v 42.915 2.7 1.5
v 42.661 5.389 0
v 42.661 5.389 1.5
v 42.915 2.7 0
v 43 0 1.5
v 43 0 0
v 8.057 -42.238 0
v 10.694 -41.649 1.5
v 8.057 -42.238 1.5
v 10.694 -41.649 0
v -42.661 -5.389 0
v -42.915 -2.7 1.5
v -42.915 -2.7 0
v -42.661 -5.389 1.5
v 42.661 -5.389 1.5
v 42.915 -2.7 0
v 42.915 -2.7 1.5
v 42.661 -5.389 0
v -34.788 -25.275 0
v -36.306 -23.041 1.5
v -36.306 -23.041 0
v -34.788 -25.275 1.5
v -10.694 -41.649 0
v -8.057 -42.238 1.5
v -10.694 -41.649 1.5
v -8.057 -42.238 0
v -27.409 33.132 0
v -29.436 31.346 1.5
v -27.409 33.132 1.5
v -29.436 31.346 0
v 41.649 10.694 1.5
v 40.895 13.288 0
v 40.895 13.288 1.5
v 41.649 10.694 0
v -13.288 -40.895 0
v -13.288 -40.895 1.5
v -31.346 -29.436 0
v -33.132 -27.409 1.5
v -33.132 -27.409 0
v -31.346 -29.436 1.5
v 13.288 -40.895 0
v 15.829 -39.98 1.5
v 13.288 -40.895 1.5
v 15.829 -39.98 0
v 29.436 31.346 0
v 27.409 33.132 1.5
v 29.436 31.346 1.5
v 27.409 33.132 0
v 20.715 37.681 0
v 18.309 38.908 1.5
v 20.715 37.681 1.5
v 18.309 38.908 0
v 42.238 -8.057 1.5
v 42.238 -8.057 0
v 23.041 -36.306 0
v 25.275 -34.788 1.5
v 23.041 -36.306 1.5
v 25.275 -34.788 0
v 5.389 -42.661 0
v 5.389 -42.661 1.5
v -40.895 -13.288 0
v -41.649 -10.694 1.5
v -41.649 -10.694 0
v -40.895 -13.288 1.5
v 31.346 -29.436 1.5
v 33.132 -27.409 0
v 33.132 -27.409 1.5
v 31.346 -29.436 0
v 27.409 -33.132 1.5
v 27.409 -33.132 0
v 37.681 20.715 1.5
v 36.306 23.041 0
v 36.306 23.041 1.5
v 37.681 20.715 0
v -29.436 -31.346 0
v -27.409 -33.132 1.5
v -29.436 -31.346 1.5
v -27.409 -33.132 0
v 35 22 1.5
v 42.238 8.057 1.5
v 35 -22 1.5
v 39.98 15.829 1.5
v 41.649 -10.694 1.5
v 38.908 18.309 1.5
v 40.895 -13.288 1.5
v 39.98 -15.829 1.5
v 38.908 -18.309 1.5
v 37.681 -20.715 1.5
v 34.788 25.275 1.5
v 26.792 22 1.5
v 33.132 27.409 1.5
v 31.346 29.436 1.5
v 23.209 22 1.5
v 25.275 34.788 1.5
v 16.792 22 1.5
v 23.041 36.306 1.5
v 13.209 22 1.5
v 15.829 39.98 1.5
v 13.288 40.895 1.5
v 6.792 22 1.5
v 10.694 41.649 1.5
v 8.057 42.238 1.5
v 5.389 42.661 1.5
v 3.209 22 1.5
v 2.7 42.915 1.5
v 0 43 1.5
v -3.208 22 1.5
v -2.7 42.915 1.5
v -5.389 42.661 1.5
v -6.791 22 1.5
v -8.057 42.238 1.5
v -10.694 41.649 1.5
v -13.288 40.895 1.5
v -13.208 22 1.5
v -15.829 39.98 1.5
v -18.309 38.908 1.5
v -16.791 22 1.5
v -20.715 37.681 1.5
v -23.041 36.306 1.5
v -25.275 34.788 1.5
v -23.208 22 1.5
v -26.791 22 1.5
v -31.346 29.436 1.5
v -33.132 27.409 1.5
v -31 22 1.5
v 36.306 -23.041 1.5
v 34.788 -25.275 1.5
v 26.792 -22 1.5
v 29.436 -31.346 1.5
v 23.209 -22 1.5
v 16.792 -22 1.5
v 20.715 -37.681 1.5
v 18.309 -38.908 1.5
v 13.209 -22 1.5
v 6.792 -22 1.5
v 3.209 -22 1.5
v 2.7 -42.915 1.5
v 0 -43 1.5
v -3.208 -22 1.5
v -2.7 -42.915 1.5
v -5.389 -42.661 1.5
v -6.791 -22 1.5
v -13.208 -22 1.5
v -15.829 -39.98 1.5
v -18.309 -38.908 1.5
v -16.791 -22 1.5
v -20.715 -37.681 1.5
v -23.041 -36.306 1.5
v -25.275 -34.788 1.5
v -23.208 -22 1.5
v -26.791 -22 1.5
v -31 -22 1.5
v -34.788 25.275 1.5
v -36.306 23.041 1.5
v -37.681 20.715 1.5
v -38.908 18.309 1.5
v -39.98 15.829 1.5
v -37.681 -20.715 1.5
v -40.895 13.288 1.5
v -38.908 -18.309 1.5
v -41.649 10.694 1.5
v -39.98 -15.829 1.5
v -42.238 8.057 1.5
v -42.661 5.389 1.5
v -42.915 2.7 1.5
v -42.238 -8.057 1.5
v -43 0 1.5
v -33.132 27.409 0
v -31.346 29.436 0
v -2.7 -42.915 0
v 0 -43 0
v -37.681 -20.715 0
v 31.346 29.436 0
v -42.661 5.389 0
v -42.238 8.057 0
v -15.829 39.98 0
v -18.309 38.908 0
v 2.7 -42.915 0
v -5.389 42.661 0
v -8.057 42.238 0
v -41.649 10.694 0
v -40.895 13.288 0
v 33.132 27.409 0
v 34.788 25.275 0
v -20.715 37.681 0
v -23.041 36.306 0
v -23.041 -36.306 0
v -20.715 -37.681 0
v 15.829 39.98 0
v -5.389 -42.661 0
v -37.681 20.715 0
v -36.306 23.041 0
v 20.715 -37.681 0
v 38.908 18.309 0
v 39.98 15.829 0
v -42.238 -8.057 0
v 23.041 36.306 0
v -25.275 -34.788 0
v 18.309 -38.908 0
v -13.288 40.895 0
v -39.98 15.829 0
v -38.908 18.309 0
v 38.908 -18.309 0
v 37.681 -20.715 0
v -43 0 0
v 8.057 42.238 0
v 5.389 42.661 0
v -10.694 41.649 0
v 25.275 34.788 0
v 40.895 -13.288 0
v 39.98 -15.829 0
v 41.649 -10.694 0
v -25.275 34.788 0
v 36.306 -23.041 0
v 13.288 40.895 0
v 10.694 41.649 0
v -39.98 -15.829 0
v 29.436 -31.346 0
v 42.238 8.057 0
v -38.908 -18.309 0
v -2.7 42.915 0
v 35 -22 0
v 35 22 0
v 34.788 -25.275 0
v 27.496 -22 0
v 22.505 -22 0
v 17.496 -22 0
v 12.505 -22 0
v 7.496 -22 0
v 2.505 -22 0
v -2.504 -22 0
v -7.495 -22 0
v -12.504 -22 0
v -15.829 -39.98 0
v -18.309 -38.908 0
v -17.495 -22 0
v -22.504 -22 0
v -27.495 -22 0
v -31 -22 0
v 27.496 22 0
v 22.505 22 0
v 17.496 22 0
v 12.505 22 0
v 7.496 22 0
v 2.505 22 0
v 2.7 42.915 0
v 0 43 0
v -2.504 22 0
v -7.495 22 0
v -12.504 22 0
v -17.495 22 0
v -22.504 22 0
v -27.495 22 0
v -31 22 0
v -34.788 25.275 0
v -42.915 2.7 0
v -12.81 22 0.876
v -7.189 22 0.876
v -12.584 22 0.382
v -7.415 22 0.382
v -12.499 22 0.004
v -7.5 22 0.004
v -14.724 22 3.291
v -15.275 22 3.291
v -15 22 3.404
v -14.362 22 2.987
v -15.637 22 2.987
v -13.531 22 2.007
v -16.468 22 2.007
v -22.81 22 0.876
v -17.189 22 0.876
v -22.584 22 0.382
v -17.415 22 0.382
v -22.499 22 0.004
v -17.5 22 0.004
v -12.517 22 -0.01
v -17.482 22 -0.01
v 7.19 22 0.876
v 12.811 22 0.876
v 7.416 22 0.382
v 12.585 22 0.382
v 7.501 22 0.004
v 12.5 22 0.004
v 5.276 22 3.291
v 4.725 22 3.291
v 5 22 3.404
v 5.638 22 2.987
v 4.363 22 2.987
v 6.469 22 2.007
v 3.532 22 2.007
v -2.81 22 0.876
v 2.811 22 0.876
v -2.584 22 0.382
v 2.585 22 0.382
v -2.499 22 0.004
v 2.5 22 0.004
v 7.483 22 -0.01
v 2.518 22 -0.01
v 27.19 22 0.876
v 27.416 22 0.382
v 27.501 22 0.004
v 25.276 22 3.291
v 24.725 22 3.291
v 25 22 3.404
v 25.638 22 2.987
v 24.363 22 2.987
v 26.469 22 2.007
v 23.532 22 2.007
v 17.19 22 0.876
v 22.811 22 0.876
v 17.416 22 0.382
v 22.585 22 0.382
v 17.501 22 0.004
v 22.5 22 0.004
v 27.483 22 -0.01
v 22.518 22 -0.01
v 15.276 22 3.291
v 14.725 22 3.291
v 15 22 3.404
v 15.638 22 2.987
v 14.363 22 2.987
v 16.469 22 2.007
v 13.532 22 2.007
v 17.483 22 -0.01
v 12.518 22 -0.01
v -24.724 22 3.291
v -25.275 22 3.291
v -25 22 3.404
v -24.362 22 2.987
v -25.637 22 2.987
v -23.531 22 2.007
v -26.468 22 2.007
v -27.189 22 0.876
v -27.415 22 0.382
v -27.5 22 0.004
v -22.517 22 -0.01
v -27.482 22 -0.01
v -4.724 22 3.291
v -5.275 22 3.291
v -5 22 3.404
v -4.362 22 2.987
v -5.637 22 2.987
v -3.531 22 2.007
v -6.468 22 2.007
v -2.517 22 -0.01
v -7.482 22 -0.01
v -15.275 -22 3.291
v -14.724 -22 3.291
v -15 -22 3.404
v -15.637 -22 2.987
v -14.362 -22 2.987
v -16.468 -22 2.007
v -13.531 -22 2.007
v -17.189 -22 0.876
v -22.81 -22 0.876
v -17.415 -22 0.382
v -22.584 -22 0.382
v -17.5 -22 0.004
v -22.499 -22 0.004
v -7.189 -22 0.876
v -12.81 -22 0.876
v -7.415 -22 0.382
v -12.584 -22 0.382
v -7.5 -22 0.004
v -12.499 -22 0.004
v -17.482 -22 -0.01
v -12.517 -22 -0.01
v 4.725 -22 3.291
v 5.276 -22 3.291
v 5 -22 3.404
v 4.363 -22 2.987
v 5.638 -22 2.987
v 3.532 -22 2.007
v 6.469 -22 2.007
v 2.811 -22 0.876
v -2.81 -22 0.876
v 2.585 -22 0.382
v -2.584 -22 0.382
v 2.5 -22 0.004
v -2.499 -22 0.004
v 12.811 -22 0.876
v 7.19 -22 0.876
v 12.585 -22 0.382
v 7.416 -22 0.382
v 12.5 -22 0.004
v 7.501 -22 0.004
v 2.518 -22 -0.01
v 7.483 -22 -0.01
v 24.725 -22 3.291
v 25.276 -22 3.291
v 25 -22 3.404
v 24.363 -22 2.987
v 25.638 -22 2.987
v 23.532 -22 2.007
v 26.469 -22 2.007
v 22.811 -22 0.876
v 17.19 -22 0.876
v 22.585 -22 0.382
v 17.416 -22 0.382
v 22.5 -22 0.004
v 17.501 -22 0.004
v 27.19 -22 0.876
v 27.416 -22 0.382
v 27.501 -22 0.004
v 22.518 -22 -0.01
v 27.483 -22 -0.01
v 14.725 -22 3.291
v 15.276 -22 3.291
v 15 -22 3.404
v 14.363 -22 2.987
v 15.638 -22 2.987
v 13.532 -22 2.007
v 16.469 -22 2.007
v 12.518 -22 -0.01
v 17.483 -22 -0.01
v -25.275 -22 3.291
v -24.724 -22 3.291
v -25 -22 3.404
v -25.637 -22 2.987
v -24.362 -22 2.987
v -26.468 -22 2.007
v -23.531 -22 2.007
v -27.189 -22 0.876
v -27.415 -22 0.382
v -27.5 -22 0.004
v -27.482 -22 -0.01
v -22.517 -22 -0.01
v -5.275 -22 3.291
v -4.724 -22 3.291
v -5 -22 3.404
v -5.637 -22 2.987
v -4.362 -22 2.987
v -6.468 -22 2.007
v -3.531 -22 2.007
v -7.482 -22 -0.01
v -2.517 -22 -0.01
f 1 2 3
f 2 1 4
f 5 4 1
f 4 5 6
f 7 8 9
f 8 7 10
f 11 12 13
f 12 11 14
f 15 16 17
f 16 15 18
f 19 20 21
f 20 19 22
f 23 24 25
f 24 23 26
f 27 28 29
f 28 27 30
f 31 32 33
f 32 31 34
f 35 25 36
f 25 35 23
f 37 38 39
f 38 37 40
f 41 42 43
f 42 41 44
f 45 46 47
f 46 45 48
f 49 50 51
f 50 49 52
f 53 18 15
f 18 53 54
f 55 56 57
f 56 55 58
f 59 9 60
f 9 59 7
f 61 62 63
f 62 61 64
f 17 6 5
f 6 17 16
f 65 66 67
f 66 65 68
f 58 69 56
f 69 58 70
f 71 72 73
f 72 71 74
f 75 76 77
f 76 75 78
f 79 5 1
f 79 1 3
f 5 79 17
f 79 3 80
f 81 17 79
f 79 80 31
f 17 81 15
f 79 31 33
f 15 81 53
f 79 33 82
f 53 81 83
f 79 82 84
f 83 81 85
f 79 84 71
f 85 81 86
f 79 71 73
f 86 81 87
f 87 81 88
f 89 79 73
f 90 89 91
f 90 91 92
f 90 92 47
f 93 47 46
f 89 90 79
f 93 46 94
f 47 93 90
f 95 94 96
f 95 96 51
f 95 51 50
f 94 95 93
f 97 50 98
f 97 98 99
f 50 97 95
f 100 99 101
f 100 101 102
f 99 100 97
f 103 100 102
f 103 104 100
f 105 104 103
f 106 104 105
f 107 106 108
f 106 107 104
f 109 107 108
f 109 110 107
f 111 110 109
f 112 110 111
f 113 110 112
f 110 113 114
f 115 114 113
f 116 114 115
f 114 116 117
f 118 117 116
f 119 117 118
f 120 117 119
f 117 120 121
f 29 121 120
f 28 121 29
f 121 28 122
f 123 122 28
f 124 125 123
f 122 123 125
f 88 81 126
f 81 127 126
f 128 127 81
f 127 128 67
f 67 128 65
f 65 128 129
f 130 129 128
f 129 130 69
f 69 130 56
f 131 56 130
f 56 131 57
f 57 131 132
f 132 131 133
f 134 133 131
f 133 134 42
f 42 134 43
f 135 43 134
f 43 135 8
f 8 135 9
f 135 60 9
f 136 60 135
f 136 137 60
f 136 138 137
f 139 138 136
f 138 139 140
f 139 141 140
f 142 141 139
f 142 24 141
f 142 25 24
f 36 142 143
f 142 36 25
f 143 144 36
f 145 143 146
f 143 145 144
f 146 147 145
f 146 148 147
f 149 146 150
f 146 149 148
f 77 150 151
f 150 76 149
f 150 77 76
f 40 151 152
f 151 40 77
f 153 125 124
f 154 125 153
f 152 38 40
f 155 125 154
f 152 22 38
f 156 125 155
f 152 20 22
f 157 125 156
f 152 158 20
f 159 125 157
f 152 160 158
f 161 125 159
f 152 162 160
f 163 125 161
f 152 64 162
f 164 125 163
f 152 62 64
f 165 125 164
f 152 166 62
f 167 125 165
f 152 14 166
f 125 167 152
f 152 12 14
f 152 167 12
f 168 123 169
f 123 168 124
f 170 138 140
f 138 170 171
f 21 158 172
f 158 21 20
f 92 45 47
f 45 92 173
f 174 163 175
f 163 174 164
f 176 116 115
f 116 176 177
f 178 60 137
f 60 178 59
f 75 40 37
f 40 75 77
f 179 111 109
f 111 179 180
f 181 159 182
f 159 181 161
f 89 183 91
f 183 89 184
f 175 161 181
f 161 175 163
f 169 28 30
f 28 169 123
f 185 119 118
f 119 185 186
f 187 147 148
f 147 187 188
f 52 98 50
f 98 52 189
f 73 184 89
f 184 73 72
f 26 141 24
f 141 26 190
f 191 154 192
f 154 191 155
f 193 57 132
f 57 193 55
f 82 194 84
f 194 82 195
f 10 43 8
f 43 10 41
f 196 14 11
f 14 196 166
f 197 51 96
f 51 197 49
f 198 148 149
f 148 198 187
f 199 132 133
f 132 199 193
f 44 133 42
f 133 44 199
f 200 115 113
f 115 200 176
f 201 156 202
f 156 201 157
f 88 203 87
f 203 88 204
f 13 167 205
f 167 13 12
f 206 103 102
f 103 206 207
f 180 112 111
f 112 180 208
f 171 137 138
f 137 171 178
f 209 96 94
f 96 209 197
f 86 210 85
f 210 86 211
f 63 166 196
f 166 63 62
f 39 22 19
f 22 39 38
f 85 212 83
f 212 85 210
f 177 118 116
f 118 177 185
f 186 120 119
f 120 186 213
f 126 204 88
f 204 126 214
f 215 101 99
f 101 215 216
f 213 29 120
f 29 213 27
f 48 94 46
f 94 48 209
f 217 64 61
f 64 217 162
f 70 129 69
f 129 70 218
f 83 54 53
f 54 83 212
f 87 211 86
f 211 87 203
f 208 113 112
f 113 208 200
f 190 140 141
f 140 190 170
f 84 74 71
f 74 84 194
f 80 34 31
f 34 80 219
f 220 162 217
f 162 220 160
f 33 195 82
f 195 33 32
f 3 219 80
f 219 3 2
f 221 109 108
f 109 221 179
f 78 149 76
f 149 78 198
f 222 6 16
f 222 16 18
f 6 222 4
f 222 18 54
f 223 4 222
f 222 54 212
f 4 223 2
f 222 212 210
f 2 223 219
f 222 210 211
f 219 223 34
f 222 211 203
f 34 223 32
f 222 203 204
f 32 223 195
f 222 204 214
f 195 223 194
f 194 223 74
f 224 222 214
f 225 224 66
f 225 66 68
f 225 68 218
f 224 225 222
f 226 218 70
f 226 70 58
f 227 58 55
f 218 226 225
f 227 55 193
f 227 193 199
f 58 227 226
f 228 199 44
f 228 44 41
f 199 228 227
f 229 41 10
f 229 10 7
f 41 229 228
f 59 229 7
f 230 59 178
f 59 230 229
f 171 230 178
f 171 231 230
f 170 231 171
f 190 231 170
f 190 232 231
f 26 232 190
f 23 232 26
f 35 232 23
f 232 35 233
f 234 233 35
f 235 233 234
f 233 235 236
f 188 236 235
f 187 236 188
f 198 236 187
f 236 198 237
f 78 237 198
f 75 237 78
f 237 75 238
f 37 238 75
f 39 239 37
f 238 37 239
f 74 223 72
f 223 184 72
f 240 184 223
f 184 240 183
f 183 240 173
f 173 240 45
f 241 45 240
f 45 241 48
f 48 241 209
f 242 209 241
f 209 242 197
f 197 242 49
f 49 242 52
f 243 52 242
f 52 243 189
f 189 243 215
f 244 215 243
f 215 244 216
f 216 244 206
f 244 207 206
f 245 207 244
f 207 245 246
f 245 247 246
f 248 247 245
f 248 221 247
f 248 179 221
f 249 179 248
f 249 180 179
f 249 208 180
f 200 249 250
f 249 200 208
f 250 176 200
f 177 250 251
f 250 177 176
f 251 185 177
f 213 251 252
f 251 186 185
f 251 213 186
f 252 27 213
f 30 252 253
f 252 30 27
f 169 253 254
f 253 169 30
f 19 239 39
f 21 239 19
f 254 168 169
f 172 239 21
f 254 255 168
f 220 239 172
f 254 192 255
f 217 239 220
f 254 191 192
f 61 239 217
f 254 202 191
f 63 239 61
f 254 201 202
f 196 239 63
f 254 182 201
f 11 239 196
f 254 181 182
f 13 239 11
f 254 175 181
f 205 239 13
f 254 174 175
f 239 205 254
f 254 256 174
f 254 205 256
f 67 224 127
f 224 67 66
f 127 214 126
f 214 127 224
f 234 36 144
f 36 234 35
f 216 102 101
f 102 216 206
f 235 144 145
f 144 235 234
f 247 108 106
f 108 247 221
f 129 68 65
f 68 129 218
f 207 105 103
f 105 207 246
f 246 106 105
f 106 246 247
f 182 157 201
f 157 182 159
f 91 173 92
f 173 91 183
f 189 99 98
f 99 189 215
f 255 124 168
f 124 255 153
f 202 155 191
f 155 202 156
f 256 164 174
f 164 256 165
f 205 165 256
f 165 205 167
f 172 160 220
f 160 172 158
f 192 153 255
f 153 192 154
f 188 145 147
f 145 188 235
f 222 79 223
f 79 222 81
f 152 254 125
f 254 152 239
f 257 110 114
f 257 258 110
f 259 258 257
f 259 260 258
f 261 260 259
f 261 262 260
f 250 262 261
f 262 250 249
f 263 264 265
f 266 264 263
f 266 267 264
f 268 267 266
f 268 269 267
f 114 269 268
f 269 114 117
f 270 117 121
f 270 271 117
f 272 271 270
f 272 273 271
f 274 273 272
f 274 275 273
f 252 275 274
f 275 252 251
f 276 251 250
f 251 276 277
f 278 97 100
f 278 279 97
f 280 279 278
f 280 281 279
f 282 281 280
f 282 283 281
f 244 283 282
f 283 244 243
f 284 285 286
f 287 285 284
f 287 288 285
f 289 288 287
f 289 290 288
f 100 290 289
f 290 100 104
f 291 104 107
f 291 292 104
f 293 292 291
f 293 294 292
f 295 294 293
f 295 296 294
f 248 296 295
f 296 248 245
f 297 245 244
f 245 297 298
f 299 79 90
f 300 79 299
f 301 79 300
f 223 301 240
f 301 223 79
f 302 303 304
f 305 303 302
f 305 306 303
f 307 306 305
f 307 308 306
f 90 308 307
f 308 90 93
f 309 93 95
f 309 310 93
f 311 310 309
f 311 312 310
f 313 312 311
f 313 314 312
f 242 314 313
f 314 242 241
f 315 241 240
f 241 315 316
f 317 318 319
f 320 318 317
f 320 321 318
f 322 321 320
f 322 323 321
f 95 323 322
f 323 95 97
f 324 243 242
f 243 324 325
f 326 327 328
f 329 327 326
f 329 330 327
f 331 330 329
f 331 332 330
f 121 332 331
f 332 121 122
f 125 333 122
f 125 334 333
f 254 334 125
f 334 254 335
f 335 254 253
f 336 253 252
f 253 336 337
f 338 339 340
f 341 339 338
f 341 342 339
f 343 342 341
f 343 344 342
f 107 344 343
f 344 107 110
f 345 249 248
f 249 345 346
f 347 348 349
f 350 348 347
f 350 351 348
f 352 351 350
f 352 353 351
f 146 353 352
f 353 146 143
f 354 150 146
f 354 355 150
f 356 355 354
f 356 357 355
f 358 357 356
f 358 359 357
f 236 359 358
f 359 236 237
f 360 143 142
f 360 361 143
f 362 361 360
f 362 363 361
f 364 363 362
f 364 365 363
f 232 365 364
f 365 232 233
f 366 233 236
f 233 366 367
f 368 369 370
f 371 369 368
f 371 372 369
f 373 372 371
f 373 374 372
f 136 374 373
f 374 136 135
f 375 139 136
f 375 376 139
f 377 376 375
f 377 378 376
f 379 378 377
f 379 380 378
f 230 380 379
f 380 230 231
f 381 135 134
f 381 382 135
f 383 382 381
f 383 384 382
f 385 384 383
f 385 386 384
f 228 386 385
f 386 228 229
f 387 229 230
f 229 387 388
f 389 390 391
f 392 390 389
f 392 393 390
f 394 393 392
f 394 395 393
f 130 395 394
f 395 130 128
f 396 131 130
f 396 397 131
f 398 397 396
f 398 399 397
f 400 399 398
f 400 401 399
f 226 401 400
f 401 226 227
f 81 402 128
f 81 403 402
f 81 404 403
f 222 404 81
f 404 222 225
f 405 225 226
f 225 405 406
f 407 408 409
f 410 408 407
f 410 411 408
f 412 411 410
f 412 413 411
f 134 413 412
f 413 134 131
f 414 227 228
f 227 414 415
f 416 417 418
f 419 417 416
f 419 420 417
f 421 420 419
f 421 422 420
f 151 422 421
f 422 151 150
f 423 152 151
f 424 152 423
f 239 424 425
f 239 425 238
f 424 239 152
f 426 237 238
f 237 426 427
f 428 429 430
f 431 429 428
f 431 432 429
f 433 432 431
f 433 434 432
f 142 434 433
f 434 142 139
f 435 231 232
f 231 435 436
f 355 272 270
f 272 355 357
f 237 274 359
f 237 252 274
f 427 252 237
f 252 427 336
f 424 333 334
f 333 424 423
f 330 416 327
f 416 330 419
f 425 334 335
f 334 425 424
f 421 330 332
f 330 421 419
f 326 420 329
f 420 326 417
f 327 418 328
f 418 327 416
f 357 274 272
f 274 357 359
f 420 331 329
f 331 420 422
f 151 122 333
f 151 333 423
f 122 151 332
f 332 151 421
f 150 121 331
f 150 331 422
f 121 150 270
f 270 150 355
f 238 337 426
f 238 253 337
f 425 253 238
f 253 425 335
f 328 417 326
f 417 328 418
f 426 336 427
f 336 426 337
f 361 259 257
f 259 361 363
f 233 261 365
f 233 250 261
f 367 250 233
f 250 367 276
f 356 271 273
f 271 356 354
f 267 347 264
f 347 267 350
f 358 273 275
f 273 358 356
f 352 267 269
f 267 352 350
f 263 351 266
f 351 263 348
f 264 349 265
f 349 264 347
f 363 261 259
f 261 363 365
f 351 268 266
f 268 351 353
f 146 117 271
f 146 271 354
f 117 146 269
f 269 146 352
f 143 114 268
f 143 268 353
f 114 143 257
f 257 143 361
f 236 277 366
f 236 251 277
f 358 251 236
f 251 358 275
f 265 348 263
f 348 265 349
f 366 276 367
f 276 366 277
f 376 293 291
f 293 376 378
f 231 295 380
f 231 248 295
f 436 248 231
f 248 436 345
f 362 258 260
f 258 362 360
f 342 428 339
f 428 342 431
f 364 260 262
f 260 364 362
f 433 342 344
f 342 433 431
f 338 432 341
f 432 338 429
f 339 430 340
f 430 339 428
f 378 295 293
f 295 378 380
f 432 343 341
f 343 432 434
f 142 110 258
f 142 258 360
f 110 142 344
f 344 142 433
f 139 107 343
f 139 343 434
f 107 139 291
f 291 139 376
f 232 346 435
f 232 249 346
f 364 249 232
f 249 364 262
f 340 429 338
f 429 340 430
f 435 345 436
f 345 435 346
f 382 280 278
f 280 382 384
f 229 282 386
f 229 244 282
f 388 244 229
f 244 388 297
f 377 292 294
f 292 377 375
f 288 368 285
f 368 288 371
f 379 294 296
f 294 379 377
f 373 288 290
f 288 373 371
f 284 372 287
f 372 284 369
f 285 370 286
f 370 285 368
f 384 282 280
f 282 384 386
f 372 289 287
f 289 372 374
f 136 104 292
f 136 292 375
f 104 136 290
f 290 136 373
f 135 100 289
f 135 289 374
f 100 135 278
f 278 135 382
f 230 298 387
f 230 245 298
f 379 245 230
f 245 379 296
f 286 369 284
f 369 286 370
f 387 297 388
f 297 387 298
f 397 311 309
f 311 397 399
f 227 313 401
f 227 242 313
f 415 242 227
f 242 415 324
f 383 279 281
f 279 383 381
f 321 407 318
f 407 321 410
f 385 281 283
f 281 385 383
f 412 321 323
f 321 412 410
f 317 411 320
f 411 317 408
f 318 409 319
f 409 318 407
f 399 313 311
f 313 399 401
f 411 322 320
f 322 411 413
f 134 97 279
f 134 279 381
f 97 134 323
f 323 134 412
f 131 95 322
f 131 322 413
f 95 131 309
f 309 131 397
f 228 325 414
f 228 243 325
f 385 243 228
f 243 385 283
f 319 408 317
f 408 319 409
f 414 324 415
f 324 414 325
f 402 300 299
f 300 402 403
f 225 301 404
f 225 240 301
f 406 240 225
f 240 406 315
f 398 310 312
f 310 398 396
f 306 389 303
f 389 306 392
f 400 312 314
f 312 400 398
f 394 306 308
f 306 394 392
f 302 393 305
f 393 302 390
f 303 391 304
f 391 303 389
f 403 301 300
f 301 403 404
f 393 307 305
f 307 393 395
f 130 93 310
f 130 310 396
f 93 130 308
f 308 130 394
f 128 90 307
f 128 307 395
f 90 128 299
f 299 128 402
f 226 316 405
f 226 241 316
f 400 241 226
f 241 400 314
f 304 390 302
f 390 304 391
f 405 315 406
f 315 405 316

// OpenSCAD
//////////////////
// FINAL PRINTS //
//////////////////

module fazor1piece()
{
	union()
	{
		difference() //upper and lower ring for holding pads
		{
			cylinder(h=3,r=53,$fn=100); //major shape
	
			translate([0,0,-.1]) //move lower ring down
			{
				difference() // get ring rather than circle
				{
					cylinder(h=2.1,r=53.1,$fn=100);
					cylinder(h=2.1,r=43,$fn=100);
				}
			}
			translate([-31,-22,-.1])
			{
				cube([66,44,5.1]);
			}
			translate([-30,-45,-.1])
			{
				rotate([0,0,-60])
				{
					cube([2,12,4]);
				}
			}
		}
		fazorStructure();
	}
}
//fazor1piece();

module fazor2piece()
{
	translate([0,-100,0])
	{
		//fazor2pieceTop();
	}
	fazor2pieceBottom();
}
fazor2piece();



//////////////////////
// Component Pieces //
//////////////////////

module fazor2pieceTop()
{
	union()
	{
		difference()
		{
			cylinder(h=1.2,r=53,$fn=100); //major shape
			translate([-31,-22,-.1])
			{
				cube([66,44,5.1]);
			}	
		}
		translate([-31,-22,0])
		{
			cube([2,2,5]);
		}
		translate([33,-22,0])
		{
			cube([2,2,5]);
		}
		translate([33,20,0])
		{
			cube([2,2,5]);
		}
		translate([-31,20,0])
		{
			cube([2,2,5]);
		}
	}
		
}
//fazor2pieceTop();

module fazor2pieceBottom()
{ 
	union()
	{
		difference()
		{
			cylinder(h=1.5,r=43,$fn=100); //major shape
			translate([-31,-22,-.2])
			{
				cube([66,44,5.3]);
			}
		}
		fazorStructure();
	}
}
//fazor2pieceBottom();

module fazorBar()
{
	union()
	{
		translate([-2.5,22,0])
		{
			rotate([90,0,0])
			{
				difference()
				{
					linear_extrude(height = 44)
					{
						scale(.5541)
						{
							import_dxf(file= "single_fazor.dxf" );
						}
					}		
					translate([0,-5,-1])
					{
						cube([5,5,46]);
					}		
				}	
			}
		}

		/*		MAGNETS, HOW DO THEY WORK
		translate([-.65,-24,-.1])
		{
			cube([1.3,48,1.3]);
		}
		*/


		/*
		translate([-.65,-23,0])
		{
			cube([1.3,3,.2]);
		}
		translate([-.65,19,0])
		{
			cube([1.3,3,.2]);
		}
		translate([-.65,-2,0])
		{
			cube([1.3,4,.2]);
		}
		*/
	}

}
//fazorBar();


module fazorStructure()
{
	translate([-25,0,-.01])
	{
		for(i=[0:5]) //foreach fazor
		{
			translate([10*i,0,0])
			{
				fazorBar();
			}
		}
	}
}
//fazorStructure();











///////////////
// Libraries //
///////////////

module equilateralTriangle (side=10, height=10, center=false)
{
	translate(center==true ? [-side/2,-sqrt(3)*side/6,-height/2] : [0,0,0])	
		linear_extrude(height=height)
			polygon(points=[[0,0],[side,0],[side/2,sqrt(3)*side/2]]);
}
